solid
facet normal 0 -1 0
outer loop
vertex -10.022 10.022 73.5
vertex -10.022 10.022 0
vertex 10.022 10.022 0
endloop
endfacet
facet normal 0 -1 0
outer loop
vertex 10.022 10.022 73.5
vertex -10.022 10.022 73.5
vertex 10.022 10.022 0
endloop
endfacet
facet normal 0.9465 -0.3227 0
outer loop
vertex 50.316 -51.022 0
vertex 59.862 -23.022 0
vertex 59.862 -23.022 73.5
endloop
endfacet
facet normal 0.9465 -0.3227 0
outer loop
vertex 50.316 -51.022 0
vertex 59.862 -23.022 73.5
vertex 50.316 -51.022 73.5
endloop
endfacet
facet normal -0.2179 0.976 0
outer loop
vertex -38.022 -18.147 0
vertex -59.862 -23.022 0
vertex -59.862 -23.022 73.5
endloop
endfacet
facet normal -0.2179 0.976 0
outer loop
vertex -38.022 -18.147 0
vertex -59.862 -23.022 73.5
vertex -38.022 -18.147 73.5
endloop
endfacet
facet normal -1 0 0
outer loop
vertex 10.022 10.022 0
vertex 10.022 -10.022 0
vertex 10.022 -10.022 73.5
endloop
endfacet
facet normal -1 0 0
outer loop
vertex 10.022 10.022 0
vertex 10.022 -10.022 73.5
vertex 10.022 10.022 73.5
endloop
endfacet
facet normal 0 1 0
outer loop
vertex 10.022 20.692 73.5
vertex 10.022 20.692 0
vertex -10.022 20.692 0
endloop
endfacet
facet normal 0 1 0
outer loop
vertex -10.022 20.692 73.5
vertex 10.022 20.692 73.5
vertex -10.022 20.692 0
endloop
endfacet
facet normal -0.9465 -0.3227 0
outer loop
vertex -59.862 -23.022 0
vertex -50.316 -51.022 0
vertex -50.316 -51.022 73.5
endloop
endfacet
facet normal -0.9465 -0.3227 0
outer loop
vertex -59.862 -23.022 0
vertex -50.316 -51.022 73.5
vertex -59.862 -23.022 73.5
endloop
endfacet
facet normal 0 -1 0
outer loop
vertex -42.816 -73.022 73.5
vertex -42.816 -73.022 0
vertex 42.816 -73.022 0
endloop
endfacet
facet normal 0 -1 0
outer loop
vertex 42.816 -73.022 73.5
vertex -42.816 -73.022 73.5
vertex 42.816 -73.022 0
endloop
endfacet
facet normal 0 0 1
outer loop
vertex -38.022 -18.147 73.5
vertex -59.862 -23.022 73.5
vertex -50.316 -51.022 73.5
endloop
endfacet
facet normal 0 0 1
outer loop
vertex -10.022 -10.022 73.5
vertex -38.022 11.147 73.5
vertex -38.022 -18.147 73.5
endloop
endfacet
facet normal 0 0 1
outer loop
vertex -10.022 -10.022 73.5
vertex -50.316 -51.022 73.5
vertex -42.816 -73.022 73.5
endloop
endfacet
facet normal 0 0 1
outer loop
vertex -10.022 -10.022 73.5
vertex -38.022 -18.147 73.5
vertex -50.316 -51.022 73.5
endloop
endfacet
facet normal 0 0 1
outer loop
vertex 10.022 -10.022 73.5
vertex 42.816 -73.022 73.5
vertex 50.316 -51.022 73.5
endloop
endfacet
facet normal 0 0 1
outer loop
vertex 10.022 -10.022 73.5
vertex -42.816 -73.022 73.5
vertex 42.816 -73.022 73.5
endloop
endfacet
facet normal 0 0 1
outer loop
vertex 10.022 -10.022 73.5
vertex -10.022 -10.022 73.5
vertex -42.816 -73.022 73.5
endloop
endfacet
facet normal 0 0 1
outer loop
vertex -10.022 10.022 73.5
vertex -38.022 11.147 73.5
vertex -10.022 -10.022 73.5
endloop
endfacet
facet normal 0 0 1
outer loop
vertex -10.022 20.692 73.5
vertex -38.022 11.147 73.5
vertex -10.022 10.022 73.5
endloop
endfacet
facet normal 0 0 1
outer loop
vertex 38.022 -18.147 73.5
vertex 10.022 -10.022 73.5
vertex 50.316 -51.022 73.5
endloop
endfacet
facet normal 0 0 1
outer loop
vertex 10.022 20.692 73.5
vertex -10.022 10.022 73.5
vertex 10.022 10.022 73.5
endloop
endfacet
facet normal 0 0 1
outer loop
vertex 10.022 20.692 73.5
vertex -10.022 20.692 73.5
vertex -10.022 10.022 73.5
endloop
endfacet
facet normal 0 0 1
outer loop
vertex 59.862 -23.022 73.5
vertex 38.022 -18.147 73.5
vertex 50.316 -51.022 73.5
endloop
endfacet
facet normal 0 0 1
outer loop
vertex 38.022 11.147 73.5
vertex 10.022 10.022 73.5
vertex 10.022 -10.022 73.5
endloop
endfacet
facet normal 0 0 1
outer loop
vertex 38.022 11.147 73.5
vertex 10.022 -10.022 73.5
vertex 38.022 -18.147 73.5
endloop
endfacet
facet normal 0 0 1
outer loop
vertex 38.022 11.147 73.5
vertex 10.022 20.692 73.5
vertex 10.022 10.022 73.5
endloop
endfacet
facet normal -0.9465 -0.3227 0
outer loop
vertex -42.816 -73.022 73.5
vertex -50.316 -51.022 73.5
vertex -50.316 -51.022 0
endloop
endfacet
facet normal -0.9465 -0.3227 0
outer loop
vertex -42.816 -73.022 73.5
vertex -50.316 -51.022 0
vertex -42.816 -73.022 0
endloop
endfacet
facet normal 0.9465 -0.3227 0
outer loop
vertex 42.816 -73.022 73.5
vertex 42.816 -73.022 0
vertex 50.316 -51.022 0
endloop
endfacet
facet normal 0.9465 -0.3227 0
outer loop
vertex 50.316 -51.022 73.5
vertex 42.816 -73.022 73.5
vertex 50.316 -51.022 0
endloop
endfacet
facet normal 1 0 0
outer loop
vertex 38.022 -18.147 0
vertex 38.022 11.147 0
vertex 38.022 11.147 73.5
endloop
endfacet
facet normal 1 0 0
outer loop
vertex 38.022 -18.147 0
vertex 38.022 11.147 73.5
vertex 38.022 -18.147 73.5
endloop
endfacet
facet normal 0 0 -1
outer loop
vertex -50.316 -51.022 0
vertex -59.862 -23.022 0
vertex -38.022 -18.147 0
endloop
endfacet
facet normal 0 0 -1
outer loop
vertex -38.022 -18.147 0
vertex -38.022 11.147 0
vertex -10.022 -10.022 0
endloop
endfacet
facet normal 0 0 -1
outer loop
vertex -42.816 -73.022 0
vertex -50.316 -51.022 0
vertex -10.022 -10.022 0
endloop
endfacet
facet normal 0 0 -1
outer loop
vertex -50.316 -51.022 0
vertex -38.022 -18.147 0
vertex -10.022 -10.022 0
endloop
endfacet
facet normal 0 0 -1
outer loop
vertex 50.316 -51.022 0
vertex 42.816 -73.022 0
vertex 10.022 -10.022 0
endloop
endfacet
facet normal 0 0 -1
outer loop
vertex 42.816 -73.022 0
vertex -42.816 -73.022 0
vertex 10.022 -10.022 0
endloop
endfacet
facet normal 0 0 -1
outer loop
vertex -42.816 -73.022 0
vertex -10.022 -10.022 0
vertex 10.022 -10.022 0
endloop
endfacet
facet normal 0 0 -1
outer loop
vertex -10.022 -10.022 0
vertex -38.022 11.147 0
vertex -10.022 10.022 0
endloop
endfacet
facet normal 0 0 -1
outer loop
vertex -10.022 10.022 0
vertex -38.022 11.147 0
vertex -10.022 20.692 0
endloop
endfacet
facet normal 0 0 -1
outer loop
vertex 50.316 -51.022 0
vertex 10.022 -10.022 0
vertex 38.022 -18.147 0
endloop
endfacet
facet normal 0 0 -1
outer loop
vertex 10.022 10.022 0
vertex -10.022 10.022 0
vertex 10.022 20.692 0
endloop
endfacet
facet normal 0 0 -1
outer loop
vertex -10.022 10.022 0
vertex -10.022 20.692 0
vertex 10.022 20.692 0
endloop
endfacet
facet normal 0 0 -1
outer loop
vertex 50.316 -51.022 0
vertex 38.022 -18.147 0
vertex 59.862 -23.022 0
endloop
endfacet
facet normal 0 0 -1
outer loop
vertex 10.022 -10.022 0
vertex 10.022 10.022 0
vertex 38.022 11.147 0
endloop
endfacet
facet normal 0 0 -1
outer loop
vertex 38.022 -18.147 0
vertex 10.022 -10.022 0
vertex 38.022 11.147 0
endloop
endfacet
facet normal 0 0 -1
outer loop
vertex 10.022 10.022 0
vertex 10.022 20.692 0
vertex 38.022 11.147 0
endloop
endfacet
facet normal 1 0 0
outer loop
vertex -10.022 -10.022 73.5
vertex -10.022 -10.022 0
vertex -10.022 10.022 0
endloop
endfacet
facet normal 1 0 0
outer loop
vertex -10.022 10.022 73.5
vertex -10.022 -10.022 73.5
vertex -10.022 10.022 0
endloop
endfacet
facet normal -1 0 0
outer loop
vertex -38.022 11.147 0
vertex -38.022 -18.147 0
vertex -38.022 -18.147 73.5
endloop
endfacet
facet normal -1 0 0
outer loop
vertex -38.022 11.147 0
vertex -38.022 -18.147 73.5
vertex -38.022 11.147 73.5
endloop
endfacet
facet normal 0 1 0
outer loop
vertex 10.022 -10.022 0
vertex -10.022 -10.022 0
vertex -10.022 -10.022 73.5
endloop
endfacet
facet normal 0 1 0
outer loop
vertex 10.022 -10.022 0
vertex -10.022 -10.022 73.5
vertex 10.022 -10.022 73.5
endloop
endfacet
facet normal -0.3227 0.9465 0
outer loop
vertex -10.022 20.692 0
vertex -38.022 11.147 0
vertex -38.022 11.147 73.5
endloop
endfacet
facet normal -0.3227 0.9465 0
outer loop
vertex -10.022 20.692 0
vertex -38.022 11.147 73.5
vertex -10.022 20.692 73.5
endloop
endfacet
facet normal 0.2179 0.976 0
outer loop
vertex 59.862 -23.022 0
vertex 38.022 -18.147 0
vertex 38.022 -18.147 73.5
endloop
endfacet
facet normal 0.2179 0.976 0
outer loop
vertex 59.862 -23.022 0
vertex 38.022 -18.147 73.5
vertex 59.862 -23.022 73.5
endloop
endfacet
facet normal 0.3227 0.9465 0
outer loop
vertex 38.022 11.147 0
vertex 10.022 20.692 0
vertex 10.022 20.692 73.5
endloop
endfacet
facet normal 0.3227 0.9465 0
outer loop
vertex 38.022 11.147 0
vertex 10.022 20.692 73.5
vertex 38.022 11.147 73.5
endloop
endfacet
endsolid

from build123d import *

# Parameters (mm, degrees)
SKETCH1_W                      = 20.045
SKETCH1_H                      = 20.045
BOSS_EXTRUDE1_DEPTH            = 73.5
CUT_EXTRUDE2_DEPTH             = 108.652129543
SKETCH3_RX                     = 9
SKETCH3_RY                     = 5
CUT_EXTRUDE4_DEPTH             = 108.652129543
CUT_EXTRUDE5_DEPTH             = 108.652129714
CUT_EXTRUDE5_DEPTH_BACK        = 108.652129714
SKETCH4_R                      = 7
SKETCH5_R                      = 7
CUT_EXTRUDE6_DEPTH             = 10
CUT_EXTRUDE7_START             = -10
SKETCH6_R                      = 7
CUT_EXTRUDE7_DEPTH             = 10
SKETCH7_R                      = 7.5
CUT_EXTRUDE8_DEPTH             = 10
SKETCH8_R                      = 7
CUT_EXTRUDE9_DEPTH             = 108.652129714
CUT_EXTRUDE9_DIRECTION_2_REACH = 109.652
SKETCH9_R                      = 2.75
CUT_EXTRUDE10_DEPTH            = 15
SKETCH10_R                     = 5.1
CUT_EXTRUDE11_DEPTH            = 4
SKETCH11_W                     = 20.045
SKETCH11_H                     = 20.045
BOSS_EXTRUDE2_DEPTH            = 73.5


with BuildPart() as part:
    # Sketch1 → Boss-Extrude1 (new body)
    with BuildSketch(Plane.XY):
        Polygon((59.861803254, -23.0225), (50.316348709, -51.0225), (-50.316348709, -51.0225), (-59.861803254, -23.0225), (-38.0225, -18.146810718), (-38.0225, 11.146810718), (-10.0225, 20.692265263), (0, 20.692265263), (10.0225, 20.692265263), (38.0225, 11.146810718), (38.0225, -18.146810718), align=None)
        Rectangle(SKETCH1_W, SKETCH1_H, mode=Mode.SUBTRACT)
        Polygon((-12.5, -26.0225), (12.5, -26.0225), (20, -48.0225), (-20, -48.0225), align=None, mode=Mode.SUBTRACT)
        Polygon((15.669537991, -26.0225), (23.169537991, -48.0225), (48.169537991, -48.0225), (55.669537991, -26.0225), align=None, mode=Mode.SUBTRACT)
        Polygon((-15.669537991, -26.0225), (-55.669537991, -26.0225), (-48.169537991, -48.0225), (-23.169537991, -48.0225), align=None, mode=Mode.SUBTRACT)
        Polygon((-13.0225, -23.5), (-13.0225, 16.5), (-35.0225, 9), (-35.0225, -16), align=None, mode=Mode.SUBTRACT)
        Polygon((35.0225, 9), (35.0225, -16), (13.0225, -23.5), (13.0225, 16.5), align=None, mode=Mode.SUBTRACT)
    extrude(amount=BOSS_EXTRUDE1_DEPTH)

    # Sketch2 → Cut-Extrude2 (cut, through all)
    with BuildSketch(Plane.XY):
        Polygon((-17.68804096, -24.0225), (-55.162041129, -24.0225), (-32.517435529, -18.967024579), align=None)
        Polygon((17.68804096, -24.0225), (55.162041129, -24.0225), (32.517435529, -18.967024579), align=None)
    extrude(amount=CUT_EXTRUDE2_DEPTH, mode=Mode.SUBTRACT)

    # Sketch3 → Cut-Extrude4 (cut, through all)
    with BuildSketch(Plane.XY):
        with Locations((0, -18)):
            Ellipse(SKETCH3_RX, SKETCH3_RY)
    extrude(amount=CUT_EXTRUDE4_DEPTH, mode=Mode.SUBTRACT)

    # Sketch4 → Cut-Extrude5 (cut, two sides: drawn at the far end of the back side and taken through both)
    with BuildSketch(Plane(origin=(0, 0, 0), x_dir=(0, 0, -1), z_dir=(1, 0, 0)).offset(-CUT_EXTRUDE5_DEPTH_BACK)):
        with Locations(Location((-36.75, -36.52, 0), (0, 0, 270))):
            Circle(SKETCH4_R)
        with Locations(Location((-58.75, -36.52, 0), (0, 0, 270))):
            Circle(SKETCH4_R)
        with Locations(Location((-14.75, -36.52, 0), (0, 0, 270))):
            Circle(SKETCH4_R)
    extrude(amount=CUT_EXTRUDE5_DEPTH + CUT_EXTRUDE5_DEPTH_BACK, mode=Mode.SUBTRACT)

    # Sketch5 → Cut-Extrude6 (cut)
    with BuildSketch(Plane(origin=(38.0225, 0, 0), x_dir=(0, 0, -1), z_dir=(1, 0, 0))):
        with Locations(Location((-36.75, -3.5, 0), (0, 0, 90))):
            Circle(SKETCH5_R)
        with Locations(Location((-14.75, -3.5, 0), (0, 0, 90))):
            Circle(SKETCH5_R)
        with Locations(Location((-58.75, -3.5, 0), (0, 0, 90))):
            Circle(SKETCH5_R)
    extrude(amount=-CUT_EXTRUDE6_DEPTH, mode=Mode.SUBTRACT)

    # Sketch6 → Cut-Extrude7 (cut)
    with BuildSketch(Plane.ZY.offset(38.0225).offset(CUT_EXTRUDE7_START)):
        with Locations(Location((36.75, -3.5, 0), (0, 0, 90))):
            Circle(SKETCH6_R)
        with Locations(Location((58.75, -3.5, 0), (0, 0, 90))):
            Circle(SKETCH6_R)
        with Locations(Location((14.75, -3.5, 0), (0, 0, 90))):
            Circle(SKETCH6_R)
    extrude(amount=CUT_EXTRUDE7_DEPTH, mode=Mode.SUBTRACT)

    # Sketch7 → Cut-Extrude8 (cut)
    with BuildSketch(Plane.XZ.offset(51.0225)):
        with Locations((0, 36.75)):
            Circle(SKETCH7_R)
        with Locations((35.16, 36.75)):
            Circle(SKETCH7_R)
        with Locations((-35.16, 36.75)):
            Circle(SKETCH7_R)
        with Locations((0, 58.75)):
            Circle(SKETCH7_R)
        with Locations((35.16, 58.75)):
            Circle(SKETCH7_R)
        with Locations((-35.16, 58.75)):
            Circle(SKETCH7_R)
        with Locations((0, 14.75)):
            Circle(SKETCH7_R)
        with Locations((35.16, 14.75)):
            Circle(SKETCH7_R)
        with Locations((-35.16, 14.75)):
            Circle(SKETCH7_R)
    extrude(amount=-CUT_EXTRUDE8_DEPTH, mode=Mode.SUBTRACT)

    # Sketch8 → Cut-Extrude9 (cut)
    with BuildSketch(Plane(origin=(0, 0, 0), x_dir=(1, 0, 0), z_dir=(0, 1, 0))):
        with Locations(Location((23.52, -36.75, 0), (0, 0, 146.422345946))):
            Circle(SKETCH8_R)
        with Locations(Location((23.52, -14.75, 0), (0, 0, 146.422345946))):
            Circle(SKETCH8_R)
        with Locations(Location((23.52, -58.75, 0), (0, 0, 146.422345946))):
            Circle(SKETCH8_R)
        with Locations(Location((-23.52, -58.75, 0), (0, 0, 33.577654054))):
            Circle(SKETCH8_R)
        with Locations(Location((-23.52, -14.75, 0), (0, 0, 33.577654054))):
            Circle(SKETCH8_R)
        with Locations(Location((-23.52, -36.75, 0), (0, 0, 33.577654054))):
            Circle(SKETCH8_R)
    extrude(amount=CUT_EXTRUDE9_DEPTH, mode=Mode.SUBTRACT)

    # Cut-Extrude9 direction 2: up to this face of the body (flat: up to its plane)
    cut_extrude9_direction_2_end = Plane(part.part.faces().sort_by_distance((-36.425041044, -24.0225, 36.75))[0])
    # Sketch8 → Cut-Extrude9 direction 2 (cut, up to the picked face)
    with BuildSketch(Plane(origin=(0, 0, 0), x_dir=(1, 0, 0), z_dir=(0, 1, 0)), mode=Mode.PRIVATE) as cut_extrude9_direction_2_sk1:
        with Locations(Location((23.52, -36.75, 0), (0, 0, 146.422345946))):
            Circle(SKETCH8_R)
    cut_extrude9_direction_2_tool1 = split(extrude(cut_extrude9_direction_2_sk1.sketch, amount=-CUT_EXTRUDE9_DIRECTION_2_REACH, mode=Mode.PRIVATE), bisect_by=cut_extrude9_direction_2_end, keep=Keep.BOTH, mode=Mode.PRIVATE)
    # Sketch8 → Cut-Extrude9 direction 2 (cut, up to the picked face)
    with BuildSketch(Plane(origin=(0, 0, 0), x_dir=(1, 0, 0), z_dir=(0, 1, 0)), mode=Mode.PRIVATE) as cut_extrude9_direction_2_sk2:
        with Locations(Location((23.52, -14.75, 0), (0, 0, 146.422345946))):
            Circle(SKETCH8_R)
    cut_extrude9_direction_2_tool2 = split(extrude(cut_extrude9_direction_2_sk2.sketch, amount=-CUT_EXTRUDE9_DIRECTION_2_REACH, mode=Mode.PRIVATE), bisect_by=cut_extrude9_direction_2_end, keep=Keep.BOTH, mode=Mode.PRIVATE)
    # Sketch8 → Cut-Extrude9 direction 2 (cut, up to the picked face)
    with BuildSketch(Plane(origin=(0, 0, 0), x_dir=(1, 0, 0), z_dir=(0, 1, 0)), mode=Mode.PRIVATE) as cut_extrude9_direction_2_sk3:
        with Locations(Location((23.52, -58.75, 0), (0, 0, 146.422345946))):
            Circle(SKETCH8_R)
    cut_extrude9_direction_2_tool3 = split(extrude(cut_extrude9_direction_2_sk3.sketch, amount=-CUT_EXTRUDE9_DIRECTION_2_REACH, mode=Mode.PRIVATE), bisect_by=cut_extrude9_direction_2_end, keep=Keep.BOTH, mode=Mode.PRIVATE)
    # Sketch8 → Cut-Extrude9 direction 2 (cut, up to the picked face)
    with BuildSketch(Plane(origin=(0, 0, 0), x_dir=(1, 0, 0), z_dir=(0, 1, 0)), mode=Mode.PRIVATE) as cut_extrude9_direction_2_sk4:
        with Locations(Location((-23.52, -58.75, 0), (0, 0, 33.577654054))):
            Circle(SKETCH8_R)
    cut_extrude9_direction_2_tool4 = split(extrude(cut_extrude9_direction_2_sk4.sketch, amount=-CUT_EXTRUDE9_DIRECTION_2_REACH, mode=Mode.PRIVATE), bisect_by=cut_extrude9_direction_2_end, keep=Keep.BOTH, mode=Mode.PRIVATE)
    # Sketch8 → Cut-Extrude9 direction 2 (cut, up to the picked face)
    with BuildSketch(Plane(origin=(0, 0, 0), x_dir=(1, 0, 0), z_dir=(0, 1, 0)), mode=Mode.PRIVATE) as cut_extrude9_direction_2_sk5:
        with Locations(Location((-23.52, -14.75, 0), (0, 0, 33.577654054))):
            Circle(SKETCH8_R)
    cut_extrude9_direction_2_tool5 = split(extrude(cut_extrude9_direction_2_sk5.sketch, amount=-CUT_EXTRUDE9_DIRECTION_2_REACH, mode=Mode.PRIVATE), bisect_by=cut_extrude9_direction_2_end, keep=Keep.BOTH, mode=Mode.PRIVATE)
    # Sketch8 → Cut-Extrude9 direction 2 (cut, up to the picked face)
    with BuildSketch(Plane(origin=(0, 0, 0), x_dir=(1, 0, 0), z_dir=(0, 1, 0)), mode=Mode.PRIVATE) as cut_extrude9_direction_2_sk6:
        with Locations(Location((-23.52, -36.75, 0), (0, 0, 33.577654054))):
            Circle(SKETCH8_R)
    cut_extrude9_direction_2_tool6 = split(extrude(cut_extrude9_direction_2_sk6.sketch, amount=-CUT_EXTRUDE9_DIRECTION_2_REACH, mode=Mode.PRIVATE), bisect_by=cut_extrude9_direction_2_end, keep=Keep.BOTH, mode=Mode.PRIVATE)
    add(cut_extrude9_direction_2_tool1.solids().sort_by(Axis((23.52, 0, 36.75), (0, -1, 0)))[0], mode=Mode.SUBTRACT)
    add(cut_extrude9_direction_2_tool2.solids().sort_by(Axis((23.52, 0, 14.75), (0, -1, 0)))[0], mode=Mode.SUBTRACT)
    add(cut_extrude9_direction_2_tool3.solids().sort_by(Axis((23.52, 0, 58.75), (0, -1, 0)))[0], mode=Mode.SUBTRACT)
    add(cut_extrude9_direction_2_tool4.solids().sort_by(Axis((-23.52, 0, 58.75), (0, -1, 0)))[0], mode=Mode.SUBTRACT)
    add(cut_extrude9_direction_2_tool5.solids().sort_by(Axis((-23.52, 0, 14.75), (0, -1, 0)))[0], mode=Mode.SUBTRACT)
    add(cut_extrude9_direction_2_tool6.solids().sort_by(Axis((-23.52, 0, 36.75), (0, -1, 0)))[0], mode=Mode.SUBTRACT)

    # Sketch9 → Cut-Extrude10 (cut)
    with BuildSketch(Plane(origin=(0, 20.692265263, 0), x_dir=(1, 0, 0), z_dir=(0, 1, 0))):
        with Locations(Location((0, -10, 0), (0, 0, 180))):
            Circle(SKETCH9_R)
        with Locations((0, -63.5)):
            Circle(SKETCH9_R)
    extrude(amount=-CUT_EXTRUDE10_DEPTH, mode=Mode.SUBTRACT)

    # Sketch10 → Cut-Extrude11 (cut)
    with BuildSketch(Plane(origin=(0, 20.692265263, 0), x_dir=(1, 0, 0), z_dir=(0, 1, 0))):
        with Locations(Location((0, -10, 0), (0, 0, 180))):
            Circle(SKETCH10_R)
        with Locations(Location((0, -63.5, 0), (0, 0, 180))):
            Circle(SKETCH10_R)
    extrude(amount=-CUT_EXTRUDE11_DEPTH, mode=Mode.SUBTRACT)

    # Sketch11 → Boss-Extrude2 (add)
    with BuildSketch(Plane.XY):
        Polygon((-50.316348709, -51.0225), (-42.816348709, -73.0225), (42.816348709, -73.0225), (50.316348709, -51.0225), (59.861803254, -23.0225), (38.0225, -18.146810718), (38.0225, 11.146810718), (10.0225, 20.692265263), (-10.0225, 20.692265263), (-38.0225, 11.146810718), (-38.0225, -18.146810718), (-59.861803254, -23.0225), align=None)
        Rectangle(SKETCH11_W, SKETCH11_H, mode=Mode.SUBTRACT)
    extrude(amount=BOSS_EXTRUDE2_DEPTH)


solid = part.part
